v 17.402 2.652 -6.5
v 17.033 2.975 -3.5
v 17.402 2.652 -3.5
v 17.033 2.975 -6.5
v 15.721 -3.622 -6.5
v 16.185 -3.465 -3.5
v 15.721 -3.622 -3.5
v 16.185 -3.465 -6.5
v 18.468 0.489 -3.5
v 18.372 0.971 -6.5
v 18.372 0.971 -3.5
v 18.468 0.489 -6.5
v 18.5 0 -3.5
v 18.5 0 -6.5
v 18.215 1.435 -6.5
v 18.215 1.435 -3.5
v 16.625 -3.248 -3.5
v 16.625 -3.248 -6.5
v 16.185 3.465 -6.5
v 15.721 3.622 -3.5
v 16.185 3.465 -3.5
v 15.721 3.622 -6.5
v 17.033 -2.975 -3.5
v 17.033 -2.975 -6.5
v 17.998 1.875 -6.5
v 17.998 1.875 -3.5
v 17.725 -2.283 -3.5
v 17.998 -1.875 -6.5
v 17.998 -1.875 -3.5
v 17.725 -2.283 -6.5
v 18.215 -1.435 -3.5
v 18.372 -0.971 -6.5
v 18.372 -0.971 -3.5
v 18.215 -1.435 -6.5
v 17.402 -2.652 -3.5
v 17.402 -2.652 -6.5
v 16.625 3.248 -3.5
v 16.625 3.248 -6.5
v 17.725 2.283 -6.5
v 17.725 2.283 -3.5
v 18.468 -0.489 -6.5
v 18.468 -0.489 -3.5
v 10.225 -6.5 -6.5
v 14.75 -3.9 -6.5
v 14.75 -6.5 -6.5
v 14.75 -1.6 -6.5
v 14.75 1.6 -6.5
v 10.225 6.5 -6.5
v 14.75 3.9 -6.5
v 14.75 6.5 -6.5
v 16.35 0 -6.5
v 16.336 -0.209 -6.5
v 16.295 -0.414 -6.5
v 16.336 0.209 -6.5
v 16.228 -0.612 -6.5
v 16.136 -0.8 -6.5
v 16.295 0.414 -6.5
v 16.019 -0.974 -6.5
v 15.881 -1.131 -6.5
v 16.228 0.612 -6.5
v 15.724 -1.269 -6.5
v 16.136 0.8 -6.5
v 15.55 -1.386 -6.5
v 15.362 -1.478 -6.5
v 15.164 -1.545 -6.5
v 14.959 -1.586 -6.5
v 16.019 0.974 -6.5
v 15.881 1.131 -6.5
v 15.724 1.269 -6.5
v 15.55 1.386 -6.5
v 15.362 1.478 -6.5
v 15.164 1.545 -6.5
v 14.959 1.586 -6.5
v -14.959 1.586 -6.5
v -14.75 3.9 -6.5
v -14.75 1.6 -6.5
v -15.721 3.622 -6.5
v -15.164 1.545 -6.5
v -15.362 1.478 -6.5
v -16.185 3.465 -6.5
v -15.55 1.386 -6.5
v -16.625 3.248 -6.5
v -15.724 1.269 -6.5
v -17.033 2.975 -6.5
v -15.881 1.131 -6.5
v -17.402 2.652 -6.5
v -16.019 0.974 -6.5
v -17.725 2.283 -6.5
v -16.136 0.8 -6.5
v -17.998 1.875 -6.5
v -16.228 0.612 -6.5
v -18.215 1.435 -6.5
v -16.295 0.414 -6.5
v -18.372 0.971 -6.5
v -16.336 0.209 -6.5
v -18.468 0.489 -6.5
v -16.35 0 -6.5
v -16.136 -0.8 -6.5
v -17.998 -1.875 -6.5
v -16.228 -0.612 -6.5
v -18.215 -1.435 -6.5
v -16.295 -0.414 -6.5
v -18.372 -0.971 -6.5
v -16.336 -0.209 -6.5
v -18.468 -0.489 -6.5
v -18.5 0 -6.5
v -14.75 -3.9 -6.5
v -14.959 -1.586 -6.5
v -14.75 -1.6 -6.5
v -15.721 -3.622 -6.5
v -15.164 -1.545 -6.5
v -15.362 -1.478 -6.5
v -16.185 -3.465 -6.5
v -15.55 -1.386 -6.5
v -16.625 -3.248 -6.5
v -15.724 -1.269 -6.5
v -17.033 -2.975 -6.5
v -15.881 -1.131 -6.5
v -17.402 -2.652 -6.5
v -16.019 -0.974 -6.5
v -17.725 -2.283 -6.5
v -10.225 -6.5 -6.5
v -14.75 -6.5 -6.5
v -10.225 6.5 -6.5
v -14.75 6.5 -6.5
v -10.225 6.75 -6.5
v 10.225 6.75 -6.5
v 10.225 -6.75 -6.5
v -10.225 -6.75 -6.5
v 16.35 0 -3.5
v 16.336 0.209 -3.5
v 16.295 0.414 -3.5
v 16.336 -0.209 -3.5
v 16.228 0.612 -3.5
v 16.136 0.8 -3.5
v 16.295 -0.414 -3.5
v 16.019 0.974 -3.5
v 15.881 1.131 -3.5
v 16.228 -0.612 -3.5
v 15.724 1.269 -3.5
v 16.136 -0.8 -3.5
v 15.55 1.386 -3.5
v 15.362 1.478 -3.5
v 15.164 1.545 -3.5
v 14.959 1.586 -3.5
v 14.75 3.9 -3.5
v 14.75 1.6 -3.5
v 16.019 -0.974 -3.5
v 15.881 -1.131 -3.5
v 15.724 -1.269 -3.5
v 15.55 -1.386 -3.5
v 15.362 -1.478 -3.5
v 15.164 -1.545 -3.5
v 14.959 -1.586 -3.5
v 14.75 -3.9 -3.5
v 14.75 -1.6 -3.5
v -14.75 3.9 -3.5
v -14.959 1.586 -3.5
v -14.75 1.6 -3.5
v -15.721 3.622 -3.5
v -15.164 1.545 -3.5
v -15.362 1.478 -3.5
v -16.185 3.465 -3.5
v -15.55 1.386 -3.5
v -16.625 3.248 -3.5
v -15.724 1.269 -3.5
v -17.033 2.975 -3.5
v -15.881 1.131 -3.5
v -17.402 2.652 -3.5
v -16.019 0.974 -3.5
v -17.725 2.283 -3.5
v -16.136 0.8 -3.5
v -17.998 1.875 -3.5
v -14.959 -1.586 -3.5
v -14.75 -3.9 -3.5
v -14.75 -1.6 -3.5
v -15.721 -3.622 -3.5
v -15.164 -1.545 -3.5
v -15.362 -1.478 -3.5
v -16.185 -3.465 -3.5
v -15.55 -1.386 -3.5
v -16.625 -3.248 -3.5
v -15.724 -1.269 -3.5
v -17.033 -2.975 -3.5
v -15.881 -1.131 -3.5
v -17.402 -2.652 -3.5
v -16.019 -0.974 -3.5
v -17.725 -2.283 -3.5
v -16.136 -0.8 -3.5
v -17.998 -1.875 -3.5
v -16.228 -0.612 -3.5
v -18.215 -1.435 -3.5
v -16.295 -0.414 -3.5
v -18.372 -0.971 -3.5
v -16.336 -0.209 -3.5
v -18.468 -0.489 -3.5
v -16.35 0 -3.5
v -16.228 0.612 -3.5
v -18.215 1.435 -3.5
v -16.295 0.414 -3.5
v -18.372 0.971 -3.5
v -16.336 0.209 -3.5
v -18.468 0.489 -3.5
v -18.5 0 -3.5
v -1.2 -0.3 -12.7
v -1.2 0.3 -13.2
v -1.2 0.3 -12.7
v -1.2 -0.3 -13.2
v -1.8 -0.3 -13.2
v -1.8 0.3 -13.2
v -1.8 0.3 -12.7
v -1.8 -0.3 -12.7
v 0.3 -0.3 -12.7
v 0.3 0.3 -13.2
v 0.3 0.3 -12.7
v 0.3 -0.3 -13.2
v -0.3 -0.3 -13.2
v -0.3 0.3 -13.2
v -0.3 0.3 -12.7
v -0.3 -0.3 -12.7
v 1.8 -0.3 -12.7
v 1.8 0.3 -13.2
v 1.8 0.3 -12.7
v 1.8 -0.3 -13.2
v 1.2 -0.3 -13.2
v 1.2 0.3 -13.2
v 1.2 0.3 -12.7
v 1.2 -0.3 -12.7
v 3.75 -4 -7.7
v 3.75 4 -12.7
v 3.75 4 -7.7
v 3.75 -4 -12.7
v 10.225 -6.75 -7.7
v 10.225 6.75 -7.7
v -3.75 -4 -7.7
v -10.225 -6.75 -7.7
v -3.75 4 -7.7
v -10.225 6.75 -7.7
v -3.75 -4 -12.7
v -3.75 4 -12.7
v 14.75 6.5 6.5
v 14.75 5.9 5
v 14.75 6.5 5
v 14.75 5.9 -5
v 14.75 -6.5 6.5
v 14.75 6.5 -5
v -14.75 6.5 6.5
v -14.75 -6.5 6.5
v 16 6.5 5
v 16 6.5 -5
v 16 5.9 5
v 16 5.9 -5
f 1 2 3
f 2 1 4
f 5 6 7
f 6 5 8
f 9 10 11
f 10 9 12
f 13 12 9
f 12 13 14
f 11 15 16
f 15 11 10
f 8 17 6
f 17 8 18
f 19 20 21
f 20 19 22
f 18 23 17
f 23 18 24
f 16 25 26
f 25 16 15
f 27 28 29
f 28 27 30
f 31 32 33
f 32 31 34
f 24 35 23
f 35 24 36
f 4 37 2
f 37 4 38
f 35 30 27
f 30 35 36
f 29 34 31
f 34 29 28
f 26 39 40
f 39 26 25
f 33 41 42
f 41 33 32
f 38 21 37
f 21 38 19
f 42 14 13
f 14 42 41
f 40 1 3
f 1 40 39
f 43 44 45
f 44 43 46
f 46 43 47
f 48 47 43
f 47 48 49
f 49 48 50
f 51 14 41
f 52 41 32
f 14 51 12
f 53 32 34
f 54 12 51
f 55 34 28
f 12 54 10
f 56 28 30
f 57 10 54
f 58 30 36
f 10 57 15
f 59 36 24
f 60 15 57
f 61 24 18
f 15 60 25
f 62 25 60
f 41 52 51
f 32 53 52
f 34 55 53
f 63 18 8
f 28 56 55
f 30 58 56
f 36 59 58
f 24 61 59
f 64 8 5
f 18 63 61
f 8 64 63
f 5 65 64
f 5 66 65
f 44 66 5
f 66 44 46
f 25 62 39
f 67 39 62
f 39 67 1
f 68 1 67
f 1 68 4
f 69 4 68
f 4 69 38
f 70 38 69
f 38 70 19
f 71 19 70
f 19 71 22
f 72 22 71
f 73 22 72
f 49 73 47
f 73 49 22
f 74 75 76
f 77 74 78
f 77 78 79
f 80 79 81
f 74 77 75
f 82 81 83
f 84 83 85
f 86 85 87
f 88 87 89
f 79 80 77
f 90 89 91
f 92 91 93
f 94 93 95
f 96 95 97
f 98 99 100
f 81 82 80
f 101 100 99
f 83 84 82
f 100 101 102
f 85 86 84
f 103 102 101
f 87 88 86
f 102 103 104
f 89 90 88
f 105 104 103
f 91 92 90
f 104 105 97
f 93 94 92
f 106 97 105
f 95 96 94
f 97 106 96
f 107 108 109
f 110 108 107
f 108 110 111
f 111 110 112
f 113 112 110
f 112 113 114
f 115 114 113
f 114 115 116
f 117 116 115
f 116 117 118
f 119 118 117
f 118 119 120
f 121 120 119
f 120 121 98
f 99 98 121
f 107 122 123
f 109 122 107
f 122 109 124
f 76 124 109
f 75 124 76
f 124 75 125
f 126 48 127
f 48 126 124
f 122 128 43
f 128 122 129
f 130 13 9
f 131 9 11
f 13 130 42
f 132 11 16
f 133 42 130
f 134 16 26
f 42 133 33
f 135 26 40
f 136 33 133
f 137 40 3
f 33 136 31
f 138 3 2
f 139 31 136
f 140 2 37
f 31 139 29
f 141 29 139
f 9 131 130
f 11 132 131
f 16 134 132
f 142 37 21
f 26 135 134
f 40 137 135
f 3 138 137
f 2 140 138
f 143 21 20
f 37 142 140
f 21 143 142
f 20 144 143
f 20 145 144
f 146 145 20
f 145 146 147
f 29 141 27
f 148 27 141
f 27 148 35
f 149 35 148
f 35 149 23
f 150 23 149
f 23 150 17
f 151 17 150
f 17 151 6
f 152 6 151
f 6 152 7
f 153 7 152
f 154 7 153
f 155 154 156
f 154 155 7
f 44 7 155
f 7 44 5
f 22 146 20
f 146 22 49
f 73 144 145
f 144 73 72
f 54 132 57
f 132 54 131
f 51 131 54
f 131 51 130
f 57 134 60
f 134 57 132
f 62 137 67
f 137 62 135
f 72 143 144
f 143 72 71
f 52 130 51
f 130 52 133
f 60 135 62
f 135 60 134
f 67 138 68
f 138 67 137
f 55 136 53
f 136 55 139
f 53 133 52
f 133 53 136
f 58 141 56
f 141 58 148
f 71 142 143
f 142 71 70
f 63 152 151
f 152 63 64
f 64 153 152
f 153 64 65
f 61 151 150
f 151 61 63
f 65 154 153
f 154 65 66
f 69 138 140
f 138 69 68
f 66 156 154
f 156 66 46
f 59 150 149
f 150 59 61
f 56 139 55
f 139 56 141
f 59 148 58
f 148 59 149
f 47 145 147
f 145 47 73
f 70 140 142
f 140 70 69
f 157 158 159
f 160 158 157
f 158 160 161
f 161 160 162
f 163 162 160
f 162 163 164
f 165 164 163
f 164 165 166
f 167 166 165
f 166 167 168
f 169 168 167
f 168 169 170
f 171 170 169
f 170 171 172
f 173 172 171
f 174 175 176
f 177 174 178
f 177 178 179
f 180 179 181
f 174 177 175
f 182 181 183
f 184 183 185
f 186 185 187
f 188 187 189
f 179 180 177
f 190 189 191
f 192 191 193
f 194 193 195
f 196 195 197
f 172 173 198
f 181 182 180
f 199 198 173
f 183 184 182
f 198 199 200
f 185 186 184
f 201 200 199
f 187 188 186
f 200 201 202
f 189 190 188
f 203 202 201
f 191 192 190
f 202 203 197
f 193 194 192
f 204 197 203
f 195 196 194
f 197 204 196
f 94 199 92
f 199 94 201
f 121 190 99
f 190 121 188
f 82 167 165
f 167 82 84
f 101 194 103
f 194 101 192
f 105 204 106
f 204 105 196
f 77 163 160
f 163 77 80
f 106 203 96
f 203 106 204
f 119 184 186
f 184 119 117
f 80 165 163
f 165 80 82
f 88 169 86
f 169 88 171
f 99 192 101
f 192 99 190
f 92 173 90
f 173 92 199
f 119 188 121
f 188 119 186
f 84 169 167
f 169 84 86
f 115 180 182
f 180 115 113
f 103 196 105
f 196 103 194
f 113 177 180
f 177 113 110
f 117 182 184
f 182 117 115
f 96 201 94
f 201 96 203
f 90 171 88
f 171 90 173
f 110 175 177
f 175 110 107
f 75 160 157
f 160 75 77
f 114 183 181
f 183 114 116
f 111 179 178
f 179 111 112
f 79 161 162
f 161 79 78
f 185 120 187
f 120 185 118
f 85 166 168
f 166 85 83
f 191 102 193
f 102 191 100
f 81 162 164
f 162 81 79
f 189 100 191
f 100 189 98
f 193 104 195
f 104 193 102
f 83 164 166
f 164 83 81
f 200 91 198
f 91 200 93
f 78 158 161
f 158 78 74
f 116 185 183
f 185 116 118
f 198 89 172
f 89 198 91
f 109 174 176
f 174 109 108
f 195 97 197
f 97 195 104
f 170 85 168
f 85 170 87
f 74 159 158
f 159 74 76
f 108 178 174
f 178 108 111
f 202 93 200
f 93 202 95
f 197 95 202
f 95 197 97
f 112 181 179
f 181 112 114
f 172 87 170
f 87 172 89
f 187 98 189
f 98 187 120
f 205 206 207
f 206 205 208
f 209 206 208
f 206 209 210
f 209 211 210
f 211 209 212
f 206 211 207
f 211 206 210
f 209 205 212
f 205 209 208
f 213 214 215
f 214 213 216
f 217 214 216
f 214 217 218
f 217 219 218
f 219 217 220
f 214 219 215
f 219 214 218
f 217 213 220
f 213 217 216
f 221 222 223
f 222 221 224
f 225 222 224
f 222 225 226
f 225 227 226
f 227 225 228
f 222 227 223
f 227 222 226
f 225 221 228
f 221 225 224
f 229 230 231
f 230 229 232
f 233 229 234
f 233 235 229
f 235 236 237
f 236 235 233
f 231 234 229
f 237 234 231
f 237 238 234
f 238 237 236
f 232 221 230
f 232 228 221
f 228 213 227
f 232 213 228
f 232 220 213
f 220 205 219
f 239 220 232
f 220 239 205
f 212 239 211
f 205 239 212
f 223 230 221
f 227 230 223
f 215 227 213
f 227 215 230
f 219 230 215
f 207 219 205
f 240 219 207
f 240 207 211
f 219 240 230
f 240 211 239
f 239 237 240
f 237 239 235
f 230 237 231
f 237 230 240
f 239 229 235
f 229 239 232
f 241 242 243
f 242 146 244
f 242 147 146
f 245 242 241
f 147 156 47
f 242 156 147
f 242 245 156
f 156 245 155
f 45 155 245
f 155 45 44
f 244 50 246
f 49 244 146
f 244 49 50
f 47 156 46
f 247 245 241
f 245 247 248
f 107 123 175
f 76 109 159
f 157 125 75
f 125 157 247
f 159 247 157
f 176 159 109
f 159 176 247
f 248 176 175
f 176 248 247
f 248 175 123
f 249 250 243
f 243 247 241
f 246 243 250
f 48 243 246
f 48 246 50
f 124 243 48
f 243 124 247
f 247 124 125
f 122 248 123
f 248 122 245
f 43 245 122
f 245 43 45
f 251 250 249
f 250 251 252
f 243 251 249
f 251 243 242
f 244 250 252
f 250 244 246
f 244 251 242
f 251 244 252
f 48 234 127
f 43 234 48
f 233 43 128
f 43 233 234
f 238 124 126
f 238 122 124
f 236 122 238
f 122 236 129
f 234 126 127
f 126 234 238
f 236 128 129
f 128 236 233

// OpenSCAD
// Sharp GP2Y0A21YK0F Distance Sensor Model
// Units: mm
// Origin: center of body
// Mounting face (PWB / connector side) faces -Z

$fn = 48;

// ===== Main dimensions from datasheet =====
body_length       = 29.5;   // main body length (between mounting tab bases)
body_width        = 13.0;   // body width (Y)
body_height       = 13.0;   // body height in front view (lens side)
total_length      = 37.0;   // including mounting tabs
tab_hole_dia      = 3.2;
tab_radius        = 3.75;   // R3.75 around holes
hole_spacing      = (total_length - 2*0); // hole-to-hole approx
// Hole centers approx at ±(total_length/2 - tab_radius) from center? use datasheet: holes are at ends
hole_offset_x     = total_length/2 - tab_radius;  // = 14.75

// Lens center offsets from body center along X
// 20 ± 0.1 between lens centers, 4.5 from edge to first lens center
lens_spacing      = 20.0;
lens_dia          = 8.0;    // approx lens aperture diameter
lens_case_width   = 8.4;    // (approx from front view)

// PWB / connector on -Z side
pwb_thickness     = 1.2;
pwb_width_x       = 16.3 + 4.15;  // approx from bottom view = 20.45
pwb_length_y      = 13.5;
connector_x       = 7.5;    // width of connector housing
connector_y       = 8.0;
connector_z       = 5.0;    // protrusion height below PWB

// Reference: body height in front view is (18.9) total including PWB & connector
// Body itself (case) ~ 13.5 - some. We'll set case height = 13 and PWB below.

case_h = body_height;   // 13 mm
// Position: body center at origin. Top of case at +Z = case_h/2, bottom at -case_h/2.
// PWB sits at bottom (-Z side).

// ===== Colors =====
case_color   = [0.15, 0.15, 0.15];
lens_color   = [0.1, 0.1, 0.1, 0.9];
pwb_color    = [0.6, 0.5, 0.2];
conn_color   = [0.9, 0.9, 0.9];
pin_color    = [0.8, 0.7, 0.2];

// ===== Main Case Body =====
module main_body() {
    color(case_color)
    translate([0, 0, 0])
        cube([body_length, body_width, case_h], center=true);
}

// ===== Mounting Tabs with holes =====
module mounting_tab(x_center) {
    color(case_color)
    difference() {
        union() {
            // Rounded tab
            translate([x_center, 0, -case_h/2 + 1.5])
                cylinder(h=3.0, r=tab_radius, center=true);
            // Connect tab to body
            hull() {
                translate([x_center, 0, -case_h/2 + 1.5])
                    cylinder(h=3.0, r=tab_radius, center=true);
                translate([sign(x_center)*(body_length/2 - 0.1), 0, -case_h/2 + 1.5])
                    cube([0.2, body_width*0.6, 3.0], center=true);
            }
        }
        // Mounting hole
        translate([x_center, 0, -case_h/2 + 1.5])
            cylinder(h=10, d=tab_hole_dia, center=true);
    }
}

// ===== Lens Cases (two round lenses on +Y face) =====
// Front view shows lenses on the front (let's put them on +Y face)
module lens_case(x_offset) {
    // Rectangular lens housing protruding slightly? 
    // From datasheet the lenses are within the body face.
    translate([x_offset, body_width/2 - 0.5, 0]) {
        // Lens ring
        color(case_color)
            rotate([90, 0, 0])
                cylinder(h=1.0, d=lens_dia + 1.0, center=false);
        // Lens
        color(lens_color)
            translate([0, -0.6, 0])
                rotate([90, 0, 0])
                    cylinder(h=0.8, d=lens_dia, center=false);
    }
}

// Rectangular window around detector lens (light detector has rectangular frame)
module detector_frame(x_offset) {
    color(case_color)
    translate([x_offset, body_width/2 - 0.3, 0])
        cube([12, 0.6, 10], center=true);
}

// ===== PWB (Printed Wiring Board) on -Z side =====
module pwb() {
    color(pwb_color)
    translate([0, 0, -case_h/2 - pwb_thickness/2])
        cube([pwb_width_x, pwb_length_y, pwb_thickness], center=true);
}

// ===== Connector on PWB (-Z side) =====
module connector() {
    // Connector positioned near center-bottom
    conn_z_top = -case_h/2 - pwb_thickness;
    color(conn_color)
        translate([0, 0, conn_z_top - connector_z/2])
            cube([connector_x, connector_y, connector_z], center=true);
    
    // 3 pins
    for (i = [-1, 0, 1]) {
        color(pin_color)
            translate([i*1.5, 0, conn_z_top - connector_z/2])
                cube([0.6, 0.6, connector_z + 1], center=true);
    }
}

// ===== Assembly =====
module gp2y0a21yk0f() {
    main_body();
    
    // Two mounting tabs
    mounting_tab( hole_offset_x);
    mounting_tab(-hole_offset_x);
    
    // Lenses: centers at ±lens_spacing/2 from body center
    // Left lens (Light emitter with round lens case)
    lens_case(-lens_spacing/2);
    // Right lens (Light detector) - has rectangular frame
    detector_frame(lens_spacing/2);
    lens_case(lens_spacing/2);
    
    // PWB
    pwb();
    
    // Connector
    connector();
}

gp2y0a21yk0f();
